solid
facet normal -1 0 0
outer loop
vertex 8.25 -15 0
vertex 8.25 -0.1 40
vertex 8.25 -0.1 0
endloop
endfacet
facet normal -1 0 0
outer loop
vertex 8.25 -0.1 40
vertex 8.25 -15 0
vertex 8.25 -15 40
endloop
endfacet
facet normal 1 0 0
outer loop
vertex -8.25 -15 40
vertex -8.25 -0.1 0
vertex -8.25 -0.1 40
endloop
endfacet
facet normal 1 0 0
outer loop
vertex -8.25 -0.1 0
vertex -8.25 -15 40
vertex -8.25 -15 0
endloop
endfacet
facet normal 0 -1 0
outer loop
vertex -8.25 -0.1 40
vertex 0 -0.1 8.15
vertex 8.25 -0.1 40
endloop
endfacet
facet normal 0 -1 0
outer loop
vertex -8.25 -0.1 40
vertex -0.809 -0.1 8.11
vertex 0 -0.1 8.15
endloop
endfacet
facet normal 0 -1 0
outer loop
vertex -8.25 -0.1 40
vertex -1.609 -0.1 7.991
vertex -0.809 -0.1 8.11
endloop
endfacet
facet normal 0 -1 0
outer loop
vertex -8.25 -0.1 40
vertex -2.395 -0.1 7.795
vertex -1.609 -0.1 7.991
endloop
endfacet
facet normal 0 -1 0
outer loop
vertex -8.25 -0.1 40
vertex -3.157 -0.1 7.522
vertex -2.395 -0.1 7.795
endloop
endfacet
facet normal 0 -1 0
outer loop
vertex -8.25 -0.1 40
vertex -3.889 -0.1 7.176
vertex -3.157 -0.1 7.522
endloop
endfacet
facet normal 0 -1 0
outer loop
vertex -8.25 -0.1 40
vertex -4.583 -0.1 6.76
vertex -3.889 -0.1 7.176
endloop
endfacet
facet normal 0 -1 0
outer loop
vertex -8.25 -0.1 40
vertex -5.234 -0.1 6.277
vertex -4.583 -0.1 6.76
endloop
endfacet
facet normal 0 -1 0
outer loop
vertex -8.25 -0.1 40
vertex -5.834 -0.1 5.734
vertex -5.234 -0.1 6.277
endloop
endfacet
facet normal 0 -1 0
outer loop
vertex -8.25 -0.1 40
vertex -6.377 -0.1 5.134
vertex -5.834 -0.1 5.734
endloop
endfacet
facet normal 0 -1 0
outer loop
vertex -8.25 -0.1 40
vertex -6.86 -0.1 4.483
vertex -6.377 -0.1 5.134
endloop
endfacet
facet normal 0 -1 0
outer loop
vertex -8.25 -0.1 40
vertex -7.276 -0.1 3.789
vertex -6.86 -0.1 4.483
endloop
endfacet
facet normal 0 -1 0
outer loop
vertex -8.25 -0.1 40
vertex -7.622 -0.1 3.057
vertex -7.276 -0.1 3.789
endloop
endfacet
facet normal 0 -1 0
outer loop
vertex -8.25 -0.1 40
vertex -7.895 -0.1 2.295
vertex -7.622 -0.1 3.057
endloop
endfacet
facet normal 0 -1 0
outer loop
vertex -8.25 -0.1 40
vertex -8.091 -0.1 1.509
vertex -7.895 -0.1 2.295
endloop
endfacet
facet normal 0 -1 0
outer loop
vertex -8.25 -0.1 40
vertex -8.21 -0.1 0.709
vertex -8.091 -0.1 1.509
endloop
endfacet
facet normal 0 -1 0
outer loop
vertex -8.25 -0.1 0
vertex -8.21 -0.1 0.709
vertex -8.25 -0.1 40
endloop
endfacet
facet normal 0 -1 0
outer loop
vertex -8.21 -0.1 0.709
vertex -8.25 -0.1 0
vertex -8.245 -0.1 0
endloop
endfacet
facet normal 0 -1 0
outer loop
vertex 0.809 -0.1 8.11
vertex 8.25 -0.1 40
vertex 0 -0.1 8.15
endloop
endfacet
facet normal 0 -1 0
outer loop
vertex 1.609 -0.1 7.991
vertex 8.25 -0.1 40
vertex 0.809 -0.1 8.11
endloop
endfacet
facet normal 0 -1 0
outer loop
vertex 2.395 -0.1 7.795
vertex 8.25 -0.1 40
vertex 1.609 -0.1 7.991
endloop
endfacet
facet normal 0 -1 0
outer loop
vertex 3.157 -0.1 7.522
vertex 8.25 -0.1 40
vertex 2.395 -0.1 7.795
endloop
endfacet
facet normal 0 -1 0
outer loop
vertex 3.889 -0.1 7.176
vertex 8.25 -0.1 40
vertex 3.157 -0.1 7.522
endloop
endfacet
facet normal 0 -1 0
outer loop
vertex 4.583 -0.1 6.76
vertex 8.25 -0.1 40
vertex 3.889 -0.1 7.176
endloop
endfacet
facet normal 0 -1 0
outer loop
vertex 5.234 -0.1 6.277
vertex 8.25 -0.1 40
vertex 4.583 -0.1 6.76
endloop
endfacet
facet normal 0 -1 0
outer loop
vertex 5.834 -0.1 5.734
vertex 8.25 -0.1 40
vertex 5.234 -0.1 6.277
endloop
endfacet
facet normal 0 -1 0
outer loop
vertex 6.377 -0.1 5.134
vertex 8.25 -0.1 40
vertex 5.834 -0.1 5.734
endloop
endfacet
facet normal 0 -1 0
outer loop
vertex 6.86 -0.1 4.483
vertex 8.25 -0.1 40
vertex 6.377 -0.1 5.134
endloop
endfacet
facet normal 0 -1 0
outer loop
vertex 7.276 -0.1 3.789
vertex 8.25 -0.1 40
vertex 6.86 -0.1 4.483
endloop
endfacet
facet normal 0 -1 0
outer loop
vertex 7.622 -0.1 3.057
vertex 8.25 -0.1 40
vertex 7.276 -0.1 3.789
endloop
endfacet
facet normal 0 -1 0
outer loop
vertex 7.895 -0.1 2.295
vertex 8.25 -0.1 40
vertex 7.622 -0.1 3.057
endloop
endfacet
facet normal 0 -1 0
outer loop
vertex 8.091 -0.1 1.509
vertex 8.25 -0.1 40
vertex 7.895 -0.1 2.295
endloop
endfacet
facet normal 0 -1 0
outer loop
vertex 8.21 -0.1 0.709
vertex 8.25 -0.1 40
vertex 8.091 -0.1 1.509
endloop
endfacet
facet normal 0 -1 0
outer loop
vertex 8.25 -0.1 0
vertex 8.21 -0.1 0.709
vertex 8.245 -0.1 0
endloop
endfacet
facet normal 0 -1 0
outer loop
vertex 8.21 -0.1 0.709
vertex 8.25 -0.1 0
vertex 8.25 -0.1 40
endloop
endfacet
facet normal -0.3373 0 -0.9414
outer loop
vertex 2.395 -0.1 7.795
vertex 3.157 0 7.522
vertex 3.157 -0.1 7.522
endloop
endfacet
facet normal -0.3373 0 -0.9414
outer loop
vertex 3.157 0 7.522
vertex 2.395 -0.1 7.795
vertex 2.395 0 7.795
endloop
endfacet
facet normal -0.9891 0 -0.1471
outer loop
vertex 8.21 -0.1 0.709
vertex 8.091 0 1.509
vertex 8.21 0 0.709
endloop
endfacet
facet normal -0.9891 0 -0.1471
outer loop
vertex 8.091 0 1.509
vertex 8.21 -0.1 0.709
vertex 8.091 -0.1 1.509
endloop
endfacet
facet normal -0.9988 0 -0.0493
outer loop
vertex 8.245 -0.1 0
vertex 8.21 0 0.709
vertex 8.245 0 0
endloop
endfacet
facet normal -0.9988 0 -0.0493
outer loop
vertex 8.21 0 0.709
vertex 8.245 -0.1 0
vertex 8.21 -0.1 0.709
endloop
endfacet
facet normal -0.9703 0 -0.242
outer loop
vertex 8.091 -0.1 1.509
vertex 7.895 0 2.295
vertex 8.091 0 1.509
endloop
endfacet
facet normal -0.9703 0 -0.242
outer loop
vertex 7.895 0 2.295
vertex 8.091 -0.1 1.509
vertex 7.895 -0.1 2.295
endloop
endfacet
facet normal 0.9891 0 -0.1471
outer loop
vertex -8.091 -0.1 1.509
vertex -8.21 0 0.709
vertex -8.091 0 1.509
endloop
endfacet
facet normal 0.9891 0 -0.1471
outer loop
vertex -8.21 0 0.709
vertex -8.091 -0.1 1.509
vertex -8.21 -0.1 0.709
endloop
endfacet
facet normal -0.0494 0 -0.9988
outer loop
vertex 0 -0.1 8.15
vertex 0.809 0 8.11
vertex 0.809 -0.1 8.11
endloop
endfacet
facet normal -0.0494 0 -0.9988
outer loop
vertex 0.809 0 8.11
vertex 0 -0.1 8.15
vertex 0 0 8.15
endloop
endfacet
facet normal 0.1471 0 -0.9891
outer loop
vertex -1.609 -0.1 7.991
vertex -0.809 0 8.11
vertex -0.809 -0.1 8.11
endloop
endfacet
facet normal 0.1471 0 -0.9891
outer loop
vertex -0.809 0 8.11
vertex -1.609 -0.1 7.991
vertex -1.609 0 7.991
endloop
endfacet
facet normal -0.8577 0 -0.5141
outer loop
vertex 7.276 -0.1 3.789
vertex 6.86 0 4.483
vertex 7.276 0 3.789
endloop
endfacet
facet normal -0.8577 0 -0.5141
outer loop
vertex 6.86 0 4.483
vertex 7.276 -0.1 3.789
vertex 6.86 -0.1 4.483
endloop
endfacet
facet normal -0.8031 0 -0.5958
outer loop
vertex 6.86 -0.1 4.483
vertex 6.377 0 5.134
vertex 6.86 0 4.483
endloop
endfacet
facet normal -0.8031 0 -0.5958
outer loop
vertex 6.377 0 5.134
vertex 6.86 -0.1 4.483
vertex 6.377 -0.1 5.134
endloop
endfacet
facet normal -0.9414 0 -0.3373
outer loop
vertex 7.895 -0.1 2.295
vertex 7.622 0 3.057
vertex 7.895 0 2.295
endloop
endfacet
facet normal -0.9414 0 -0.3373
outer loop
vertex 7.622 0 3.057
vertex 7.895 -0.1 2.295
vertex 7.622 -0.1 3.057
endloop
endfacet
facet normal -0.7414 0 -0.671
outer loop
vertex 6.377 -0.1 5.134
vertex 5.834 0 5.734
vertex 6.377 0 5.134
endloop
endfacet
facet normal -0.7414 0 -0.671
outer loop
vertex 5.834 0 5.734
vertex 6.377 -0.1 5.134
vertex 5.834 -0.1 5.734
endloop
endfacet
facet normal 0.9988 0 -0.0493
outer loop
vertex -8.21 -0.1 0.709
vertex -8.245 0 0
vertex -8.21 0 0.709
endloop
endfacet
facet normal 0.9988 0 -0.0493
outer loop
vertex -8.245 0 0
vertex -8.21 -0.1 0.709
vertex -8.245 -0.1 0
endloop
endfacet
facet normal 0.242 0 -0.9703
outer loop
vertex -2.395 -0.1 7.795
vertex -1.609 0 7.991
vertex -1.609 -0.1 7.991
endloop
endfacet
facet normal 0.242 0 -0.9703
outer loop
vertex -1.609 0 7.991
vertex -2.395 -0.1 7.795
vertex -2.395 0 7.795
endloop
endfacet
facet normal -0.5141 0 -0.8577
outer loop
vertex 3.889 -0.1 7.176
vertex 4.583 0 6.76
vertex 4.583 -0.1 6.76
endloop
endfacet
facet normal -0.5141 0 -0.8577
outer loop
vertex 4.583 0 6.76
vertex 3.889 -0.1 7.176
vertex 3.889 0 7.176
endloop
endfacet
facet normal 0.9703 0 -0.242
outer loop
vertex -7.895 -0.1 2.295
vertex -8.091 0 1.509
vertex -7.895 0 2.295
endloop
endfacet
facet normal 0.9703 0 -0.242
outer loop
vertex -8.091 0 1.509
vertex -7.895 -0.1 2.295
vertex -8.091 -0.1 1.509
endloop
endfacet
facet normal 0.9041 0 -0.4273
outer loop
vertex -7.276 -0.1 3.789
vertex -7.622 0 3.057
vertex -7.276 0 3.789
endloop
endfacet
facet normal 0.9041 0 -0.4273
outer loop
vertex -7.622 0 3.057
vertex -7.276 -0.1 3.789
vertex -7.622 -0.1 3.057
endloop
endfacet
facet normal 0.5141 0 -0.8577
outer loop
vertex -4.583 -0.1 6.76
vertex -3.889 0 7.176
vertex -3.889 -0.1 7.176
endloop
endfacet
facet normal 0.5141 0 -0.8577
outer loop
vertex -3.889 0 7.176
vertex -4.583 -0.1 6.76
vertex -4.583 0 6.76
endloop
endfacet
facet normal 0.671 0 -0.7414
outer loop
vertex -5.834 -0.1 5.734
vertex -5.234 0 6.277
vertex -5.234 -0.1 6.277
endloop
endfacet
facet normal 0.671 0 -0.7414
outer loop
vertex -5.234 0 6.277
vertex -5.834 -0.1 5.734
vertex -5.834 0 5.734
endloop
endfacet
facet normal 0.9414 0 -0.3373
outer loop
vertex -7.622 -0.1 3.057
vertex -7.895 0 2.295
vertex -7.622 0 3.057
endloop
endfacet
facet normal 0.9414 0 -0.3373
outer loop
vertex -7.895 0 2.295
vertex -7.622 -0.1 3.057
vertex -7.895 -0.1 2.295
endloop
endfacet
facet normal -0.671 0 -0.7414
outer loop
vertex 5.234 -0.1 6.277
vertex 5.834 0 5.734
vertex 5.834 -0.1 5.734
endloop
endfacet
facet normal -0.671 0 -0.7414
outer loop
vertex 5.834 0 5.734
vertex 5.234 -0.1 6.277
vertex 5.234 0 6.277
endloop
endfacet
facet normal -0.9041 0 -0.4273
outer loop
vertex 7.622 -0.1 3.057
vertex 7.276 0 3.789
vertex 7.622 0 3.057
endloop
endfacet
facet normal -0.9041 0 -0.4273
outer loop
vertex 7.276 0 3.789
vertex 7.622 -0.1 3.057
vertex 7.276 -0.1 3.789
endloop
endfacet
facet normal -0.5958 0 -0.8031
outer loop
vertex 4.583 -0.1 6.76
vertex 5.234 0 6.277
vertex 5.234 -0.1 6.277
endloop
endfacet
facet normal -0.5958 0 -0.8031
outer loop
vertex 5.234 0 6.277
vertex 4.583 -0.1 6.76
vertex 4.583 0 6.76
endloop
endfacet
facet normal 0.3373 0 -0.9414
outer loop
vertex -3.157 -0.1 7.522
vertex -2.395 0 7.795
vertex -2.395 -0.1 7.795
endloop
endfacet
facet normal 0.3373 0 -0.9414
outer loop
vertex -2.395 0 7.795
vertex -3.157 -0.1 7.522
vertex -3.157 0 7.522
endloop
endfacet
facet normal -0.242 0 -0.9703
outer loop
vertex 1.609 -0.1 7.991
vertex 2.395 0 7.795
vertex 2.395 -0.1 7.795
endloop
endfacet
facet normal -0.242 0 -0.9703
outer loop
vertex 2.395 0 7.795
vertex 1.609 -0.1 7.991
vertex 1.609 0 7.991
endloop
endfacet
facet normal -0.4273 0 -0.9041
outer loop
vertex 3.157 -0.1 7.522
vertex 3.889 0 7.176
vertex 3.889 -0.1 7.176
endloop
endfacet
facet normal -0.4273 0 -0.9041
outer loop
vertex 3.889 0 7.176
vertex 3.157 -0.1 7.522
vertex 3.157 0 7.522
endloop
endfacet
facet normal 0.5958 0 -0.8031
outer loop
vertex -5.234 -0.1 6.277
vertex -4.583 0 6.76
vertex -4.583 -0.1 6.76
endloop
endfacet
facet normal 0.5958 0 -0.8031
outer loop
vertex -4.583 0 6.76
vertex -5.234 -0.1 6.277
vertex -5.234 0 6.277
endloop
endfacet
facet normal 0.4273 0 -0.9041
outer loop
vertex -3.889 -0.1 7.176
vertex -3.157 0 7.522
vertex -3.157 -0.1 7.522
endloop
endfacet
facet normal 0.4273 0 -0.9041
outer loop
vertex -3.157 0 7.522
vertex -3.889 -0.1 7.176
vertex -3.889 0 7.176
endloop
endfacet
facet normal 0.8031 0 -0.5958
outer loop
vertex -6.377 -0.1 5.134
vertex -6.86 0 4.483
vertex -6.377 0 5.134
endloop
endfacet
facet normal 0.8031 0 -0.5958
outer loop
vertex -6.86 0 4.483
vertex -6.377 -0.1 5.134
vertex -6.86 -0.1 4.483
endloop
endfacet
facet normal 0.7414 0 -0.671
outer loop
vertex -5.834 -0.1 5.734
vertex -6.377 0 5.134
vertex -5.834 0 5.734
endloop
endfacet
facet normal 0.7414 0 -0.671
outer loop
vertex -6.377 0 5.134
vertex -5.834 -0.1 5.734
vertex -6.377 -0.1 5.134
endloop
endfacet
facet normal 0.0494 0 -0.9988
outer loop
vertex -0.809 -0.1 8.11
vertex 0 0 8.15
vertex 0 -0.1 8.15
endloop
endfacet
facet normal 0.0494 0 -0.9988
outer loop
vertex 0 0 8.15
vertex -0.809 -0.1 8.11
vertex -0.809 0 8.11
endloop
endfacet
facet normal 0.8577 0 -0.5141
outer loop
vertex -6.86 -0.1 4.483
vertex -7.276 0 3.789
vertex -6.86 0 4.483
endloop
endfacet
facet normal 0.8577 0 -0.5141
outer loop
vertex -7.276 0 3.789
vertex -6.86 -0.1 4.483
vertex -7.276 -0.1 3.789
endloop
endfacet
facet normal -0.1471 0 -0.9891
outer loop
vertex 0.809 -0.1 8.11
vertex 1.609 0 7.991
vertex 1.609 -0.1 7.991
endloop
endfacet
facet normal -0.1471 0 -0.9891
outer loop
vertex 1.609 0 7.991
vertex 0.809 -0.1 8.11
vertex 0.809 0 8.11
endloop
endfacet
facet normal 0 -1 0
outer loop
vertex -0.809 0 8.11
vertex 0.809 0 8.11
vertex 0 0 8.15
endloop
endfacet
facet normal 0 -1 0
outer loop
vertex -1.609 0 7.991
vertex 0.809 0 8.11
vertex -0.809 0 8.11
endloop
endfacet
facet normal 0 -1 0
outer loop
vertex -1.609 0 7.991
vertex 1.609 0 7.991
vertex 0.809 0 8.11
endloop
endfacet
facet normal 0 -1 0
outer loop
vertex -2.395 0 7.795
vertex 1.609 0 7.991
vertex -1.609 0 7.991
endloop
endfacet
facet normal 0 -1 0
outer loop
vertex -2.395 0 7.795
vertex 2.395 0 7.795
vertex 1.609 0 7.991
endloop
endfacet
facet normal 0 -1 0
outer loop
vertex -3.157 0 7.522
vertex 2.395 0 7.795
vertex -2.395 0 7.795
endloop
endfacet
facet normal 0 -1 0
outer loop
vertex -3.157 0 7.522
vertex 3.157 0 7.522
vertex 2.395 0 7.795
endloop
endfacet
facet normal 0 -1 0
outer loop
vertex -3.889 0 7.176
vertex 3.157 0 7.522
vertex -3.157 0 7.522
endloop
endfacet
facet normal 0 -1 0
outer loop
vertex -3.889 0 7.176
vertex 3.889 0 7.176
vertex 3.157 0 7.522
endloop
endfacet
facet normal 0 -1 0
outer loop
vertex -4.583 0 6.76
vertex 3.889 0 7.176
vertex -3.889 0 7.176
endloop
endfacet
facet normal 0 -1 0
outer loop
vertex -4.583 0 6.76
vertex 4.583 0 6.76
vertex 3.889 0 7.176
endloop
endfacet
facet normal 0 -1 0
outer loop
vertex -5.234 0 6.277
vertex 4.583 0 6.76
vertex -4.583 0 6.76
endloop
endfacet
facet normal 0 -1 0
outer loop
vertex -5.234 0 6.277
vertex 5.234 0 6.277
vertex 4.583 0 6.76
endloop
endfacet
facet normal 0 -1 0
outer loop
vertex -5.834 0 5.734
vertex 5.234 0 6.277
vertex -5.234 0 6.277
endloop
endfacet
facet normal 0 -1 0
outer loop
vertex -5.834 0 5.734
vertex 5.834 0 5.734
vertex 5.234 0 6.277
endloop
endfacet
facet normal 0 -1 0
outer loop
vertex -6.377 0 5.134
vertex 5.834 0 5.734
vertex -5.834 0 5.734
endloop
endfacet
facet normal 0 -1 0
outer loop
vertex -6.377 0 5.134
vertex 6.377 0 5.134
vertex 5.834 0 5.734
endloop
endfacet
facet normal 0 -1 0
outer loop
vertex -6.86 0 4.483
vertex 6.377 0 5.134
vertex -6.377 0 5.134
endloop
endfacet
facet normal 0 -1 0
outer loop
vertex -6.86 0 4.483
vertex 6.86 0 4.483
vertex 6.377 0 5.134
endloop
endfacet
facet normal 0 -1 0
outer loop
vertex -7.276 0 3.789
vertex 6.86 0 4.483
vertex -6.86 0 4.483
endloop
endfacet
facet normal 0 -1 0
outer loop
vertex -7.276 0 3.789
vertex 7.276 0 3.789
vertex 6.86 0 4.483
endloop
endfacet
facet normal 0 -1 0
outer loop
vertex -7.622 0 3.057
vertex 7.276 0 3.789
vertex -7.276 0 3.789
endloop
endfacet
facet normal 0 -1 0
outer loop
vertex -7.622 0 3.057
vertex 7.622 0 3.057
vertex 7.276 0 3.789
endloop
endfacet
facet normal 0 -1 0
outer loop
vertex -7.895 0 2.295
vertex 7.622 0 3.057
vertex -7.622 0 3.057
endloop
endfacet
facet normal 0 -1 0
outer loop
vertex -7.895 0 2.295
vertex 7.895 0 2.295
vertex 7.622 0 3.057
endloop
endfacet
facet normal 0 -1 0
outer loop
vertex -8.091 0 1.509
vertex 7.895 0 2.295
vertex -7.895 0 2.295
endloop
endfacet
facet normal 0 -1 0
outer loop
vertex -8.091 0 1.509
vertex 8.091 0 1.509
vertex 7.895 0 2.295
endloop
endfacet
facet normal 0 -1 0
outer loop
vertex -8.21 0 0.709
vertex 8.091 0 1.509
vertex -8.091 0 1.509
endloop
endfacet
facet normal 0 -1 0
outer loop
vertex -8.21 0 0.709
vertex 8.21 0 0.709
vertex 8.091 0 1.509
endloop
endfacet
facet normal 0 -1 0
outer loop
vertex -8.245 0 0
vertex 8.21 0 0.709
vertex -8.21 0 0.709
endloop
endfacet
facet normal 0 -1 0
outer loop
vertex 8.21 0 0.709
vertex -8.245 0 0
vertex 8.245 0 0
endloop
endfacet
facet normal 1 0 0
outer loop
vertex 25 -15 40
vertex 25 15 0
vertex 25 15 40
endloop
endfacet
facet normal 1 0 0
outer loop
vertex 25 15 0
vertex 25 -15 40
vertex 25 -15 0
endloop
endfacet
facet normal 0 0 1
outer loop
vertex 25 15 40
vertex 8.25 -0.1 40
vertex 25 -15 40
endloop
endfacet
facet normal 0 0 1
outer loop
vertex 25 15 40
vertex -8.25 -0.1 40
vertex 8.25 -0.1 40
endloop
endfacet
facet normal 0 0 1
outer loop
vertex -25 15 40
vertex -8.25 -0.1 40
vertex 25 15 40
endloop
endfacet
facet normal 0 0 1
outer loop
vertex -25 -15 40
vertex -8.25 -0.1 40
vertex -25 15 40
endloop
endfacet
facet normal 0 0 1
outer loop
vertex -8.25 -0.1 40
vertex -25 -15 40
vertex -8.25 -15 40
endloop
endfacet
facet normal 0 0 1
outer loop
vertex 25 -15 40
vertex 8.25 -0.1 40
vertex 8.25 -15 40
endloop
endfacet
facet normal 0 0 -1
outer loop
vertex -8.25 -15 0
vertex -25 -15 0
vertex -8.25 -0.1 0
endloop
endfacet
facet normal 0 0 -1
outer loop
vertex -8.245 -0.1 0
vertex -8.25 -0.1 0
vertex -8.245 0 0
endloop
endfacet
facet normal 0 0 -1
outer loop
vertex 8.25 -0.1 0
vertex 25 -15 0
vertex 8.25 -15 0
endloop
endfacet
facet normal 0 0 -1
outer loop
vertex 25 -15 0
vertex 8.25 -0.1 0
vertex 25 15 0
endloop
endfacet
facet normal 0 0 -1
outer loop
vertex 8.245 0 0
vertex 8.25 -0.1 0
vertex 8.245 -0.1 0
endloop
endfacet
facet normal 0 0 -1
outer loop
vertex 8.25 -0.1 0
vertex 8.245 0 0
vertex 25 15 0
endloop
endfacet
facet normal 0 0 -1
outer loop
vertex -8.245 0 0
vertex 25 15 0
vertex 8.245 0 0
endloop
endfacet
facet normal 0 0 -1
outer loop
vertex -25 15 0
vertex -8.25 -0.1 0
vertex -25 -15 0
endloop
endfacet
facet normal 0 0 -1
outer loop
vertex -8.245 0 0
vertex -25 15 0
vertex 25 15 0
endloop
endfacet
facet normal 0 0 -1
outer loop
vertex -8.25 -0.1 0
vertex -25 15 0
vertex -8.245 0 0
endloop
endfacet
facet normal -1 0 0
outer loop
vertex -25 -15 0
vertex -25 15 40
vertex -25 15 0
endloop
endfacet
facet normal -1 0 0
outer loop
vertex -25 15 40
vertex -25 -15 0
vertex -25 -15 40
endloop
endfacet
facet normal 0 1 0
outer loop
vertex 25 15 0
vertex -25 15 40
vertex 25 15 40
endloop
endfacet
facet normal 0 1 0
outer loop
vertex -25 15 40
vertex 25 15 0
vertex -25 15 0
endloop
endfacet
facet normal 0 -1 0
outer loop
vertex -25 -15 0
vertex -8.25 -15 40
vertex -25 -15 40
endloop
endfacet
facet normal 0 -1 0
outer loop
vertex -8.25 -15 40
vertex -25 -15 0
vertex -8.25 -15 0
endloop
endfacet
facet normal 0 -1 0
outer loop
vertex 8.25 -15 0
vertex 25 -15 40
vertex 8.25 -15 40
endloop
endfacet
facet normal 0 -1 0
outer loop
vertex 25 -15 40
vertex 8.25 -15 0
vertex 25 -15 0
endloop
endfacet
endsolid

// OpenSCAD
// --- Dimensions (mm) ---
block_width = 50;           // X dimension
block_depth = 30;           // Y dimension
block_height = 40;          // Z dimension

barrel_channel_width = 16.5; // Width of the syringe barrel slot
barrel_radius = barrel_channel_width / 2;

flange_slot_width = 34;     // Width of the flange cutout
flange_slot_height = 2.6;   // Height of the flange cutout
flange_slot_z_start = 30;   // Bottom Z of flange slot
flange_slot_z_end = 32.6;   // Top Z of flange slot
flange_slot_depth_back = 11; // How far back the slot goes (from front face y=-15 to y=-4)
// Note: Prompt says "cut in from the front face back to y=11". 
// Since front face is y=-15, y=11 is 26mm deep. 
// However, the block is only 30mm deep (from y=-15 to y=15).
// If it goes from y=-15 to y=11, it's 26mm deep.

screw_hole_dia = 4.5;       // Diameter for M4 screws
screw_hole_x_offset = 19;   // X position of screw holes
screw_hole_z = 15;          // Z position of screw holes

// --- Constants ---
$fn = 64;

// --- Main Construction ---

// The block is centered on X and Y, resting on Z=0.
// Front face is at y = -15, Back face is at y = 15.
module holder_body() {
    translate([-block_width/2, -block_depth/2, 0])
    cube([block_width, block_depth, block_height]);
}

difference() {
    // 1. The main block
    holder_body();

    // 2. The Barrel Channel
    // "back end is a half-circle of 8.25mm radius centred at x=0, y=0"
    // "straight sides run forward to the front face (y=-15)"
    // This implies the void is a rectangle from y=-15 to y=0 
    // plus a semi-circle centered at (0,0) extending into the positive Y space.
    union() {
        // Rectangular part of the channel
        translate([-barrel_radius, -15 - 0.1, -0.1])
        cube([barrel_channel_width, 15, block_height + 0.2]);
        
        // Semi-circular part at the back (centered at x=0, y=0)
        // We use a cylinder and cut it in half using a large cube
        translate([0, 0, -0.1])
        rotate([90, 0, 0])
        cylinder(r = barrel_radius, h = 0.2); 
        // The cylinder above is actually a disk. Let's do it properly:
        
        translate([0, 0, -0.1])
        rotate([90, 0, 0])
        cylinder(r = barrel_radius, h = 0.2);
    }
    // Wait, the logic above is messy. Let's use a cleaner subtraction for the U-channel:
    // We want a shape that is a rectangle [ -8.25, 8.25 ] x [ -15, 0 ] 
    // and a semi-circle centered at (0,0) with radius 8.25.
    
    // Let's restart the difference block logic clearly.
}

// RE-WRITING THE ENTIRE DIFFERENCE BLOCK FOR CLARITY AND ACCURACY
difference() {
    // The main block
    holder_body();

    // --- SUBTRACTIONS ---

    // 1. The Barrel Channel
    // We create a shape consisting of a rectangle and a semi-cylinder
    translate([0, 0, -1]) {
        // Rectangular part: from y=-15 to y=0
        translate([-barrel_radius, -15, 0])
        cube([barrel_channel_width, 15, block_height + 2]);
        
        // Semi-circular part: centered at y=0, extending to y=8.25
        // We use a cylinder and a cube to cut it in half
        translate([0, 0, 0])
        rotate([90, 0, 0])
        cylinder(r = barrel_radius, h = 0.1); // This is a disk at y=0
        
        // To make it a proper semi-cylinder:
        translate([0, 0, 0])
        rotate([90, 0, 0])
        cylinder(r = barrel_radius, h = 0.1); // This is not working well.
    }
    // Let's use a simpler method for the U-channel:
    // A rectangle from y=-15 to y=8.25, with the back corners rounded.
    // Actually, the prompt says "back end is a half-circle... at x=0, y=0".
    // This means the void is a rectangle from y=-15 to y=0, and a semi-circle at y=0.
    // Let's just define the void as a union of a rectangle and a cylinder.
    
    // Let's try again.
}

// FINAL ATTEMPT AT THE LOGIC
difference() {
    // The main block
    holder_body();

    // 1. The Barrel Channel (U-shape)
    // Rectangle part: x=[-8.25, 8.25], y=[-15, 0], z=[0, 40]
    translate([-barrel_radius, -15 - 0.1, -0.1])
    cube([barrel_channel_width, 15, block_height + 0.2]);
    
    // Semi-circle part: centered at (0,0), radius 8.25, extending to y=8.25
    // We use a cylinder and a cube to cut it in half.
    translate([0, 0, -0.1])
    rotate([90, 0, 0])
    cylinder(r = barrel_radius, h = 0.2); // This is a disk. 
    // Let's use a proper semi-cylinder:
    translate([0, 0, -0.1])
    rotate([90, 0, 0])
    intersection() {
        cylinder(r = barrel_radius, h = block_height + 0.2);
        translate([-barrel_radius, -0.1, -0.1])
        cube([barrel_channel_width, 8.25 + 0.1, block_height + 0.2]);
    }
    // Wait, the intersection is better. Let's use a simpler approach:
    // A cylinder centered at (0,0) with radius 8.25, but we only want the part where y > 0.
    // No, the prompt says "back end is a half-circle... at x=0, y=0".
    // This means the void is the union of:
    // - Rectangle: x=[-8.25, 8.25], y=[-15, 0], z=[0, 40]
    // - Semi-circle: x=[-8.25, 8.25], y=[0, 8.25], z=[0, 40]
    
    // Let's use the "hull" of two shapes to make the channel.
    // Shape 1: Rectangle at y=-15
    // Shape 2: Semi-circle at y=0
    // This is getting complicated. Let's use the most direct way:
    // A cylinder centered at (0,0) and a rectangle.
    
    // Let's use this:
    // 1. A cylinder centered at (0,0) with radius 8.25.
    // 2. A rectangle from y=-15 to y=0.
    // The union of these two is the channel.
    
    // Wait, I must put this inside the difference() block.
    // Let's rewrite the whole file from scratch to ensure it's perfect.
}

// --- FINAL RE-WRITE ---
// (This is the actual code that will be provided)
